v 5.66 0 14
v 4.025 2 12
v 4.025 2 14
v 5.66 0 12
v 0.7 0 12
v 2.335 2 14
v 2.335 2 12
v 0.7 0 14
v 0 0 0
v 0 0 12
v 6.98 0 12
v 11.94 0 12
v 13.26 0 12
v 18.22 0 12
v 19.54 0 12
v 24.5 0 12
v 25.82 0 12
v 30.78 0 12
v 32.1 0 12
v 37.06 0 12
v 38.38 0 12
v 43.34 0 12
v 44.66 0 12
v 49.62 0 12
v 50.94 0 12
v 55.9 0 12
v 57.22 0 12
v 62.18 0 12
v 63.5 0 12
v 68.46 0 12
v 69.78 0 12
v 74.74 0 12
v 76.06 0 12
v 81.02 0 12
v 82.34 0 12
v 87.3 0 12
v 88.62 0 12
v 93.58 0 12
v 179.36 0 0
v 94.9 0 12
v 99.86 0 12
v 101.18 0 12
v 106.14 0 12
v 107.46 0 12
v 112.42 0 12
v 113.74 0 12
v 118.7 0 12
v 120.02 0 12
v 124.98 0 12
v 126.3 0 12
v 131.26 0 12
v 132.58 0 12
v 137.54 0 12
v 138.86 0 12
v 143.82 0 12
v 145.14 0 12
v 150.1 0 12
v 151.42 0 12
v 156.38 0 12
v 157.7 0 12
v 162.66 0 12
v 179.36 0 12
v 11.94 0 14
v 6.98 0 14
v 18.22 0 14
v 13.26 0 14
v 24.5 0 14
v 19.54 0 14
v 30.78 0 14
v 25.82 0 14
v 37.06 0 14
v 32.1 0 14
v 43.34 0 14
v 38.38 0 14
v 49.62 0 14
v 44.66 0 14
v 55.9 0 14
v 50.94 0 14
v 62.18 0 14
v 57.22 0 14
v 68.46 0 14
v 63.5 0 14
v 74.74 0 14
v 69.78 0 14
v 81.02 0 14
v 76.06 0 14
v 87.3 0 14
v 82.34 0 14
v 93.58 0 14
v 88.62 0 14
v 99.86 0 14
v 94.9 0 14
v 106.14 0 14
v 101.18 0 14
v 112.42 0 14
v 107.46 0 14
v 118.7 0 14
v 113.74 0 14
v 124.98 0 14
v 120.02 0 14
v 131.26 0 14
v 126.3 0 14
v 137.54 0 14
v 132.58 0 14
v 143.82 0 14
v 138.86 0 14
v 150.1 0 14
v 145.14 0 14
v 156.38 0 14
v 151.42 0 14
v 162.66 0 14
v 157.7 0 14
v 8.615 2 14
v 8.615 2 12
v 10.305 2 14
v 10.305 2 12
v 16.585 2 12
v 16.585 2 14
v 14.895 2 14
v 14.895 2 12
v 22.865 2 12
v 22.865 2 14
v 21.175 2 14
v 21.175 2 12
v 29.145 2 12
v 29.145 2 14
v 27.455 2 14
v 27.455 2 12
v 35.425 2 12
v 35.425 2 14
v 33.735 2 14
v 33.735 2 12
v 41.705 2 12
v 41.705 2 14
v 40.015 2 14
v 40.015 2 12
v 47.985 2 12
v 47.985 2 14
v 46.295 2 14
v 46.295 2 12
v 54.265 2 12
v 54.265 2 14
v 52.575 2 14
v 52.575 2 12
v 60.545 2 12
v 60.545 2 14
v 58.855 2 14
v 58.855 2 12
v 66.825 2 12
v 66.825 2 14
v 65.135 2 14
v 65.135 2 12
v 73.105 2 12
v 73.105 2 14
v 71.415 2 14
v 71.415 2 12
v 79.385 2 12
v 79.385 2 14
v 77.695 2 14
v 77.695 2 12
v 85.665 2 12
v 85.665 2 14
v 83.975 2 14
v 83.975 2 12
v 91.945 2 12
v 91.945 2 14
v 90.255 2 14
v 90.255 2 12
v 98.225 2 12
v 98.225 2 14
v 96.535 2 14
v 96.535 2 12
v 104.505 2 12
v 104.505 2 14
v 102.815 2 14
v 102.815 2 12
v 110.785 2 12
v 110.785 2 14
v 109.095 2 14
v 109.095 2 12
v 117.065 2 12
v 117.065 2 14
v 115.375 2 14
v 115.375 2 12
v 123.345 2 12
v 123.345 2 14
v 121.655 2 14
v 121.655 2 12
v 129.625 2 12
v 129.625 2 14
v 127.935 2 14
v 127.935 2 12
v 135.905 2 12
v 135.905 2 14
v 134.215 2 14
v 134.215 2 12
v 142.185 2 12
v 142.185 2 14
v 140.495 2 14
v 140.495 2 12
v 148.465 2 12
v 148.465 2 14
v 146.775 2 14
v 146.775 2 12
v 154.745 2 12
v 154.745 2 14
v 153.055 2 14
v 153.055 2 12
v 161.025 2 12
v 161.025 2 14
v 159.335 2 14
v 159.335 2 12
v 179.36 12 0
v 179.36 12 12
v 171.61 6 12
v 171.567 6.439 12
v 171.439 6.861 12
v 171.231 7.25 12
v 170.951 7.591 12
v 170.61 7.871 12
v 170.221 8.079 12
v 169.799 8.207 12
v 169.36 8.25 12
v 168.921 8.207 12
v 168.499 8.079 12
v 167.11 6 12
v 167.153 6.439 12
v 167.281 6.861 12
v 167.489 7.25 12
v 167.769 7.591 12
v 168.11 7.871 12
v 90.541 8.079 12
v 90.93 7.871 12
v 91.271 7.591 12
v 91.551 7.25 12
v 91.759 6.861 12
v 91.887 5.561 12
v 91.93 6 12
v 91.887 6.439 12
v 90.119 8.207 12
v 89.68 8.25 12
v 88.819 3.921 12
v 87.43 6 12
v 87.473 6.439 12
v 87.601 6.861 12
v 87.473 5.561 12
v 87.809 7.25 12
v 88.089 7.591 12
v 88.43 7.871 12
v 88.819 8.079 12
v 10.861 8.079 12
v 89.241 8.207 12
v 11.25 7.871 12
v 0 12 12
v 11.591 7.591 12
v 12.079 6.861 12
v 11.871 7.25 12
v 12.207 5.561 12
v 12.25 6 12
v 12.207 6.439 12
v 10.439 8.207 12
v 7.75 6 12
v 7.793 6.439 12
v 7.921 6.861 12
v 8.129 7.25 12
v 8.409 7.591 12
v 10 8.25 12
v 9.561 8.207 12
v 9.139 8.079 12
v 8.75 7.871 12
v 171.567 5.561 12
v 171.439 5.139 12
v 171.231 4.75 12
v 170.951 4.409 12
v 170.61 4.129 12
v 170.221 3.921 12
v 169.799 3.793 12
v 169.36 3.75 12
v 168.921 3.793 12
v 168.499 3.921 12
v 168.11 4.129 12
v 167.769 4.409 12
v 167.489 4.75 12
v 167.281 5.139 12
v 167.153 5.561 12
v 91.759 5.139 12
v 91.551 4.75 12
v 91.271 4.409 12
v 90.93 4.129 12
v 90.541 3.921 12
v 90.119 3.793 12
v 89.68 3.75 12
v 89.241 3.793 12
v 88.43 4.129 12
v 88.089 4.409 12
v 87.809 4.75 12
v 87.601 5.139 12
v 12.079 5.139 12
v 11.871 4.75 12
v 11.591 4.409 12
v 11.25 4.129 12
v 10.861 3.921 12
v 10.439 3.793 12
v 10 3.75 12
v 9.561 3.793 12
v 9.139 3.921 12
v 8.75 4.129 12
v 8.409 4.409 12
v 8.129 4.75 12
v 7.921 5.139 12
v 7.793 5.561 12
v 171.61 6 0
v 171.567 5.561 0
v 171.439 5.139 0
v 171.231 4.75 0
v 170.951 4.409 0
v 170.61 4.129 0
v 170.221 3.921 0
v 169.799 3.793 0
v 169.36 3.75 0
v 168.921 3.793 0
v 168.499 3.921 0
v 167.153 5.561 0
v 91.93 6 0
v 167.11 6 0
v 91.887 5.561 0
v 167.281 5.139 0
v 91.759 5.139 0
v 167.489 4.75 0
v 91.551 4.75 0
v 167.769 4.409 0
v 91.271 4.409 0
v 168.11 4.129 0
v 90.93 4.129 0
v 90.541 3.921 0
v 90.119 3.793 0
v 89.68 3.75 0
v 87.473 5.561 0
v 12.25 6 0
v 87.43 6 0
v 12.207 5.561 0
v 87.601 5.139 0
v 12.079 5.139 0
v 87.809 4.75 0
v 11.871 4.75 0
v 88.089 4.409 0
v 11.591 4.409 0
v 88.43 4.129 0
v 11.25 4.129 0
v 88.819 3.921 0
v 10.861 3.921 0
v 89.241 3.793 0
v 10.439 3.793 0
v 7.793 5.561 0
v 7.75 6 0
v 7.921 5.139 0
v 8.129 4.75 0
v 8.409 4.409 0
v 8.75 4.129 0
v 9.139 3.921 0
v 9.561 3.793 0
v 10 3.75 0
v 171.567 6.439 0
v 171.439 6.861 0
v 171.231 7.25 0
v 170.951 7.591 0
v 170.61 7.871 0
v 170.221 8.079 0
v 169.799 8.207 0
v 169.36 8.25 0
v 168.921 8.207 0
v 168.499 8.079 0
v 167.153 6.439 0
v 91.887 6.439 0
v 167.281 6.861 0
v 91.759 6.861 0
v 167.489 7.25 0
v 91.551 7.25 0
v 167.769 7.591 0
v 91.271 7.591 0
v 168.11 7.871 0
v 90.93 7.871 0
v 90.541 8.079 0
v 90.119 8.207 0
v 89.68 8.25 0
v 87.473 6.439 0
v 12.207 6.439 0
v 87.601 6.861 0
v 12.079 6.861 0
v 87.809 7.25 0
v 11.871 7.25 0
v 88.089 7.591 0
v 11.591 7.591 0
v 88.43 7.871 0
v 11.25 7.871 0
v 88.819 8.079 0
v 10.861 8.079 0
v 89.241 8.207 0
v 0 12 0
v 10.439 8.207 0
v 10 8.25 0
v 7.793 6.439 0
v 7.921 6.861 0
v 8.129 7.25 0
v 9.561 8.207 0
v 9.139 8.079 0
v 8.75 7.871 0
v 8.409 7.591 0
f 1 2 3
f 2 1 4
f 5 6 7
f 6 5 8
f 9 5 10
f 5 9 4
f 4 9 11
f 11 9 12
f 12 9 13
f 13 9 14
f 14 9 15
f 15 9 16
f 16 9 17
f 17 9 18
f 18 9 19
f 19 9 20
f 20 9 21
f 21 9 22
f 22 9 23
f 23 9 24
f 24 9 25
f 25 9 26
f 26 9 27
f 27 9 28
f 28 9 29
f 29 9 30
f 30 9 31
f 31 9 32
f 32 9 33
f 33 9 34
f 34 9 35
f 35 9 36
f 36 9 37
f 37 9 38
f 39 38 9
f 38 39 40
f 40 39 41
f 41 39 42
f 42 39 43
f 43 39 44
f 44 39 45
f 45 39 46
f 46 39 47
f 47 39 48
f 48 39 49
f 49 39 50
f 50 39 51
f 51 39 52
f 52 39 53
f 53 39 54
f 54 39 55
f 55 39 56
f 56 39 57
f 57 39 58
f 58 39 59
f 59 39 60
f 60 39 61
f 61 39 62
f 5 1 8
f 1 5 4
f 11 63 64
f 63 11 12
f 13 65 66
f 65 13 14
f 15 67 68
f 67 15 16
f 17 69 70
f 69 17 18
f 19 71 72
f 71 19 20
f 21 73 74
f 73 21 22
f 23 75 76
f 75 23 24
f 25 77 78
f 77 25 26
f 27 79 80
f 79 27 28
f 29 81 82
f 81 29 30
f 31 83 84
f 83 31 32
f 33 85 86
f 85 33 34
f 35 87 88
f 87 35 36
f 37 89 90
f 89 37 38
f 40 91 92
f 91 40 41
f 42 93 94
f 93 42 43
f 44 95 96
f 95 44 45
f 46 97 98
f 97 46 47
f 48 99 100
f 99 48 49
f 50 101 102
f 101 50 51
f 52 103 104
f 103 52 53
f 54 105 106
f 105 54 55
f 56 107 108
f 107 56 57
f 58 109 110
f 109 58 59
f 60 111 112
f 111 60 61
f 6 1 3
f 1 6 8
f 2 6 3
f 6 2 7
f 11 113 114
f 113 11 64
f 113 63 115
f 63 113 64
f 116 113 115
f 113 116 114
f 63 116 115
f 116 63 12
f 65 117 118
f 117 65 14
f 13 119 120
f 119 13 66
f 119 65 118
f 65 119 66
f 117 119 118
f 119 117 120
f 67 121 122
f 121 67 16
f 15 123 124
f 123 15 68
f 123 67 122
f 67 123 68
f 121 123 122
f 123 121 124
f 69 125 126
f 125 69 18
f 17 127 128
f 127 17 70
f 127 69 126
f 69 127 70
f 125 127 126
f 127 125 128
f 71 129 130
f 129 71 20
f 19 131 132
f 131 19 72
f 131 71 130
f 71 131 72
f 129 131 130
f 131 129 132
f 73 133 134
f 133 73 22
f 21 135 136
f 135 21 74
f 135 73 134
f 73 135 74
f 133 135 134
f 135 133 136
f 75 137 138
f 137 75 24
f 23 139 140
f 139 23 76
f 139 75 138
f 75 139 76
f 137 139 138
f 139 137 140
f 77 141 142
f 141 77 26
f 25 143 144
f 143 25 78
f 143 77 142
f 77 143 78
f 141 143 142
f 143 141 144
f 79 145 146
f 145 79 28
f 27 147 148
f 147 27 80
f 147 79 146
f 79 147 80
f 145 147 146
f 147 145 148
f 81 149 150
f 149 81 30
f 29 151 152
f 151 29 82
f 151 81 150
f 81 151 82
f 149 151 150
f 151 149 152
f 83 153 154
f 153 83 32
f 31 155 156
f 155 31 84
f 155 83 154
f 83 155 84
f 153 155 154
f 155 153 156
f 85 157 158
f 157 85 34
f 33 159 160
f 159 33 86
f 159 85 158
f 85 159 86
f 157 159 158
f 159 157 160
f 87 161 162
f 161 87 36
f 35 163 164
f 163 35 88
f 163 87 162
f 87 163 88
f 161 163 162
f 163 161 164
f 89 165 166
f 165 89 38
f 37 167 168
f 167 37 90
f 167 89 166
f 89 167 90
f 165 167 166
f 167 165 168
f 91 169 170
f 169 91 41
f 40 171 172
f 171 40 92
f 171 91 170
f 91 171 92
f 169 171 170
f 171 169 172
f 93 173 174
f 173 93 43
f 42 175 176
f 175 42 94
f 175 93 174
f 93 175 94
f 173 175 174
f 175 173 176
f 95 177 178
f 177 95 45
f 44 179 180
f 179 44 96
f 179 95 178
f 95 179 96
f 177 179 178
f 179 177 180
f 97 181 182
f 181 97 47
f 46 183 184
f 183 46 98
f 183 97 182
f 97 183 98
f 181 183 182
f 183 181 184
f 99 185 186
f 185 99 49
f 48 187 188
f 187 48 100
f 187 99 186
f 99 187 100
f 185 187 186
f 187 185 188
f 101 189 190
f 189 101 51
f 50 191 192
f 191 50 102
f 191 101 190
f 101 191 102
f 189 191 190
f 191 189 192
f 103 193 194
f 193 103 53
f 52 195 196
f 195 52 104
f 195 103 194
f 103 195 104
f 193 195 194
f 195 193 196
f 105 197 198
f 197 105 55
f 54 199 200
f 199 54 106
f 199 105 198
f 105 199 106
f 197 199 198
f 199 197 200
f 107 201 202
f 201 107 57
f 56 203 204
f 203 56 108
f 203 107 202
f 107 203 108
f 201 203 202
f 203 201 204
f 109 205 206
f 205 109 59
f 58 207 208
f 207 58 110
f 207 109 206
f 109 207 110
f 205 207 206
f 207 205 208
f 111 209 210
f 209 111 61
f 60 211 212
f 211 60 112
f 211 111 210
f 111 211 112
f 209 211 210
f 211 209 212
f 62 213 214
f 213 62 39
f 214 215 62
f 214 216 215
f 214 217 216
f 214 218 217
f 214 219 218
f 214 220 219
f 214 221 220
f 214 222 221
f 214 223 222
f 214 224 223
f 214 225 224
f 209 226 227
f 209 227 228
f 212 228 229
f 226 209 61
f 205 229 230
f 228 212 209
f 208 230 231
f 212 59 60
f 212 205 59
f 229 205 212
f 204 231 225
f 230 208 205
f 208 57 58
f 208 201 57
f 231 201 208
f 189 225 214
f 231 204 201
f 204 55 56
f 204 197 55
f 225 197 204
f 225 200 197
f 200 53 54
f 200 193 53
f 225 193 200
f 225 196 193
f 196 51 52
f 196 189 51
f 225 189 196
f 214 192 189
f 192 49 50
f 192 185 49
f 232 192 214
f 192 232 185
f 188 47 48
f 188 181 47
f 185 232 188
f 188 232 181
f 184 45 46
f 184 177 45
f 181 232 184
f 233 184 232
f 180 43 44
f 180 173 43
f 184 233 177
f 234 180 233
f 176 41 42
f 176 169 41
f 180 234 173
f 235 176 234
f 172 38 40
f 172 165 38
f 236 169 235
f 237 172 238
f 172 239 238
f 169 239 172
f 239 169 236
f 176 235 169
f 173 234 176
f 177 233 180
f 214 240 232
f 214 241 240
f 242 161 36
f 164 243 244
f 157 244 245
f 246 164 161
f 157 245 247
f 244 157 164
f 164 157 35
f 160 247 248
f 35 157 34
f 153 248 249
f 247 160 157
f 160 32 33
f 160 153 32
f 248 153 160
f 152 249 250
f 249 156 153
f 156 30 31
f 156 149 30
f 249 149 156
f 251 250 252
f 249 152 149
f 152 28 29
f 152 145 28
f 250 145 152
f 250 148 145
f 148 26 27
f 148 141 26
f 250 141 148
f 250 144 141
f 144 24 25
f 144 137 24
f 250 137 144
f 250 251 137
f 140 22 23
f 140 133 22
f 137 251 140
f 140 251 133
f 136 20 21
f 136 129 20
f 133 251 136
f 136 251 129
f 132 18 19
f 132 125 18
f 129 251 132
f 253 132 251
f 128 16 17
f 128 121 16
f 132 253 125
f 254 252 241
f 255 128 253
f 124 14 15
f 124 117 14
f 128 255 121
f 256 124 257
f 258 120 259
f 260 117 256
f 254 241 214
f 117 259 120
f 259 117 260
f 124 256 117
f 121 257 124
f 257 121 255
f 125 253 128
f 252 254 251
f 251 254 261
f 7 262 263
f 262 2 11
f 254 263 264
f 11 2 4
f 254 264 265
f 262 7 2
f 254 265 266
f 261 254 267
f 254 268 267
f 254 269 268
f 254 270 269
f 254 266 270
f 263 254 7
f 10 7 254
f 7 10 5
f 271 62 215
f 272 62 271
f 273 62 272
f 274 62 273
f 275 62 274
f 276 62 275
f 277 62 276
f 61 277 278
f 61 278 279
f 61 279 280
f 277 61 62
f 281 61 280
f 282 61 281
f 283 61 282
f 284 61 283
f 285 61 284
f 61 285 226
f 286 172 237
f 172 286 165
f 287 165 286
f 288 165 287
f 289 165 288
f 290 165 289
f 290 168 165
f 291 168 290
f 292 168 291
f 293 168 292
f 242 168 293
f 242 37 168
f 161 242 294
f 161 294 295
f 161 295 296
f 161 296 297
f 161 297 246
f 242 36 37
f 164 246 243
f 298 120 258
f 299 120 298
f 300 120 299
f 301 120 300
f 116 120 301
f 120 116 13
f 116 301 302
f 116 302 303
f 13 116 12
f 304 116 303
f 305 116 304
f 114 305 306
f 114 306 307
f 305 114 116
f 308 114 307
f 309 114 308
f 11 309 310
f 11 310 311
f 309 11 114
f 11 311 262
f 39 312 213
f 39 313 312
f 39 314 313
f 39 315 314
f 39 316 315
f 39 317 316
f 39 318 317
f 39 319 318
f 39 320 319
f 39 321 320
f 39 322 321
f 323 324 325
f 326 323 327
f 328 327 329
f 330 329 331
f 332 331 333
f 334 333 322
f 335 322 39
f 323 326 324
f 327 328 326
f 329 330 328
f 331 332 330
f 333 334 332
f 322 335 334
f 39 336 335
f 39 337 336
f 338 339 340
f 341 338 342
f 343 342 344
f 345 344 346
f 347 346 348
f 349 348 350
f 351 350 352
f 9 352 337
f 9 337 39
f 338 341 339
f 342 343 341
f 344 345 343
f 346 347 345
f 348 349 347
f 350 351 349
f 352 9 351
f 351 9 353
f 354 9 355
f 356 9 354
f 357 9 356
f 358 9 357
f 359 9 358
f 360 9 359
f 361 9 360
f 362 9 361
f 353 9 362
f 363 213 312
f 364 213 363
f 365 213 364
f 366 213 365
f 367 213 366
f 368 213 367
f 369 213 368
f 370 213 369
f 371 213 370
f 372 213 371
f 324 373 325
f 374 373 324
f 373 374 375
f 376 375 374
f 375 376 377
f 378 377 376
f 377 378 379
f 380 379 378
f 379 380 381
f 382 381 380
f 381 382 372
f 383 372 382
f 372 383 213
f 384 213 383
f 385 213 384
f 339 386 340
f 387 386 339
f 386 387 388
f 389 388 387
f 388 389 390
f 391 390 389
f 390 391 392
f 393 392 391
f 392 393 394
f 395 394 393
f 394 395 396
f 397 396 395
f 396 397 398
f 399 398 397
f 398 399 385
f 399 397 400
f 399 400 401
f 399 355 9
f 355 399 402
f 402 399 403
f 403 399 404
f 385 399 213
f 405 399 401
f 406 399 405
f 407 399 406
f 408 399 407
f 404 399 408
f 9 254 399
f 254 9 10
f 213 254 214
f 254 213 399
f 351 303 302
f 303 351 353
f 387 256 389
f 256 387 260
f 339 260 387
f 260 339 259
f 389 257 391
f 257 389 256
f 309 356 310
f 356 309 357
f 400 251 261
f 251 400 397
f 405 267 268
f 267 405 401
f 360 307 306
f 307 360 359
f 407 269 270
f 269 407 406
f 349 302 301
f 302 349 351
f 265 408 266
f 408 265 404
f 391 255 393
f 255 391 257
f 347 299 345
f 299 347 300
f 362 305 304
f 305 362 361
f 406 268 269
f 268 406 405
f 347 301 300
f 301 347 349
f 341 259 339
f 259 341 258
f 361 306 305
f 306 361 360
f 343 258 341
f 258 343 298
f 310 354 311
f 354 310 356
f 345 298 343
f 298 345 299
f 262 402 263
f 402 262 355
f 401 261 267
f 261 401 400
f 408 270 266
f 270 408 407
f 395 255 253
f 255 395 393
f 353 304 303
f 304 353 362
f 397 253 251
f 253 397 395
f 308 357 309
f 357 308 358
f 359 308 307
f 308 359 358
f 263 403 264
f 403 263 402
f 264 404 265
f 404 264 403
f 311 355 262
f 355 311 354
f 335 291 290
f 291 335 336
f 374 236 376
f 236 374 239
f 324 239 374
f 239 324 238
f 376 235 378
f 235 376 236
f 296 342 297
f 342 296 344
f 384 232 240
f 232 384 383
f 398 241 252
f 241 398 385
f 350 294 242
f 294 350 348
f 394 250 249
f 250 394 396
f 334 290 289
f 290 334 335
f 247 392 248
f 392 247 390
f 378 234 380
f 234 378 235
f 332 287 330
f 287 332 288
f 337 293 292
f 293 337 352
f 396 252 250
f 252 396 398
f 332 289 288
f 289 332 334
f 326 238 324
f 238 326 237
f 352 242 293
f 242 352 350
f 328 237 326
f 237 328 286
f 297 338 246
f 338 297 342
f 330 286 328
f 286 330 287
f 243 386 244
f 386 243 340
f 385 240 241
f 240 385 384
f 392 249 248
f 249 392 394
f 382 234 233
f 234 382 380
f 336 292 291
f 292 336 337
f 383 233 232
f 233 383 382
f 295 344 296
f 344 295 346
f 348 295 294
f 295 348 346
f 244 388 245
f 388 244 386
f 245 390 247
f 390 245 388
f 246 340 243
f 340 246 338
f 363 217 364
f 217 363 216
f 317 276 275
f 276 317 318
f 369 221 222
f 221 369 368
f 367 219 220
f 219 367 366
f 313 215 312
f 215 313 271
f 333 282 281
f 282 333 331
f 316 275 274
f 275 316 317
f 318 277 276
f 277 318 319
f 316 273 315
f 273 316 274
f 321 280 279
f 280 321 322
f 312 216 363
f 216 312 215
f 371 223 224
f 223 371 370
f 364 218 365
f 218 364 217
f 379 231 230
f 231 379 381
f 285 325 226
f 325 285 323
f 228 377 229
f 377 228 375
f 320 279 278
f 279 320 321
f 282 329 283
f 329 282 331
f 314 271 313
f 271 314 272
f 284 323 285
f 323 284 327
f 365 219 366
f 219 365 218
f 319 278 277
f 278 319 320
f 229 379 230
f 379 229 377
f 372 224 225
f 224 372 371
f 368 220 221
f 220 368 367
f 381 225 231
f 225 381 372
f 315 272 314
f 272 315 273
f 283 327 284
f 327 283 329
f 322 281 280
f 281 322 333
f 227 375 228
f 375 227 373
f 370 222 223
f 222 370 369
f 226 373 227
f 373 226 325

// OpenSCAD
$fn = 32;

// ----------------------------------------------------------------------
// Gear rack: m=2 z=26, 179.36 x 12 x 14 mm
// ----------------------------------------------------------------------

// --- parameters (mm) ---
bar_len = 179.36;         // rack length, X
bar_w = 12;               // rack width, Y
bar_h = 14;               // overall height, Z
gear_module = 2;          // module
base_t = 12;              // tooth root line height
pitch = 6.28;             // circular pitch
tip_w = 1.69;             // tooth thickness at the tip
root_w = 4.96;            // tooth thickness at the root line
hole_d = 4.5;             // mounting hole
sink = 0.6;               // tooth root overlap into the body

tooth_span = 163.36;

module tooth(x0) {
  /* 20 deg flank profile, sunk into the body for a positive overlap */
  translate([x0, 0, base_t - sink])
    linear_extrude(height = bar_h - base_t + sink)
      polygon(points = [[-root_w / 2, 0], [root_w / 2, 0],
                        [tip_w / 2, bar_h - base_t],
                        [-tip_w / 2, bar_h - base_t]]);
}

difference() {
  union() {
    cube([bar_len, bar_w, base_t]);
    for (i = [0 : 26 - 1])
      tooth((i + 0.5) * pitch + (tooth_span - 26 * pitch) / 2);
  }
  translate([10, 6, -1]) cylinder(h = base_t + 2, d = hole_d);
  translate([89.68, 6, -1]) cylinder(h = base_t + 2, d = hole_d);
  translate([169.36, 6, -1]) cylinder(h = base_t + 2, d = hole_d);
}
